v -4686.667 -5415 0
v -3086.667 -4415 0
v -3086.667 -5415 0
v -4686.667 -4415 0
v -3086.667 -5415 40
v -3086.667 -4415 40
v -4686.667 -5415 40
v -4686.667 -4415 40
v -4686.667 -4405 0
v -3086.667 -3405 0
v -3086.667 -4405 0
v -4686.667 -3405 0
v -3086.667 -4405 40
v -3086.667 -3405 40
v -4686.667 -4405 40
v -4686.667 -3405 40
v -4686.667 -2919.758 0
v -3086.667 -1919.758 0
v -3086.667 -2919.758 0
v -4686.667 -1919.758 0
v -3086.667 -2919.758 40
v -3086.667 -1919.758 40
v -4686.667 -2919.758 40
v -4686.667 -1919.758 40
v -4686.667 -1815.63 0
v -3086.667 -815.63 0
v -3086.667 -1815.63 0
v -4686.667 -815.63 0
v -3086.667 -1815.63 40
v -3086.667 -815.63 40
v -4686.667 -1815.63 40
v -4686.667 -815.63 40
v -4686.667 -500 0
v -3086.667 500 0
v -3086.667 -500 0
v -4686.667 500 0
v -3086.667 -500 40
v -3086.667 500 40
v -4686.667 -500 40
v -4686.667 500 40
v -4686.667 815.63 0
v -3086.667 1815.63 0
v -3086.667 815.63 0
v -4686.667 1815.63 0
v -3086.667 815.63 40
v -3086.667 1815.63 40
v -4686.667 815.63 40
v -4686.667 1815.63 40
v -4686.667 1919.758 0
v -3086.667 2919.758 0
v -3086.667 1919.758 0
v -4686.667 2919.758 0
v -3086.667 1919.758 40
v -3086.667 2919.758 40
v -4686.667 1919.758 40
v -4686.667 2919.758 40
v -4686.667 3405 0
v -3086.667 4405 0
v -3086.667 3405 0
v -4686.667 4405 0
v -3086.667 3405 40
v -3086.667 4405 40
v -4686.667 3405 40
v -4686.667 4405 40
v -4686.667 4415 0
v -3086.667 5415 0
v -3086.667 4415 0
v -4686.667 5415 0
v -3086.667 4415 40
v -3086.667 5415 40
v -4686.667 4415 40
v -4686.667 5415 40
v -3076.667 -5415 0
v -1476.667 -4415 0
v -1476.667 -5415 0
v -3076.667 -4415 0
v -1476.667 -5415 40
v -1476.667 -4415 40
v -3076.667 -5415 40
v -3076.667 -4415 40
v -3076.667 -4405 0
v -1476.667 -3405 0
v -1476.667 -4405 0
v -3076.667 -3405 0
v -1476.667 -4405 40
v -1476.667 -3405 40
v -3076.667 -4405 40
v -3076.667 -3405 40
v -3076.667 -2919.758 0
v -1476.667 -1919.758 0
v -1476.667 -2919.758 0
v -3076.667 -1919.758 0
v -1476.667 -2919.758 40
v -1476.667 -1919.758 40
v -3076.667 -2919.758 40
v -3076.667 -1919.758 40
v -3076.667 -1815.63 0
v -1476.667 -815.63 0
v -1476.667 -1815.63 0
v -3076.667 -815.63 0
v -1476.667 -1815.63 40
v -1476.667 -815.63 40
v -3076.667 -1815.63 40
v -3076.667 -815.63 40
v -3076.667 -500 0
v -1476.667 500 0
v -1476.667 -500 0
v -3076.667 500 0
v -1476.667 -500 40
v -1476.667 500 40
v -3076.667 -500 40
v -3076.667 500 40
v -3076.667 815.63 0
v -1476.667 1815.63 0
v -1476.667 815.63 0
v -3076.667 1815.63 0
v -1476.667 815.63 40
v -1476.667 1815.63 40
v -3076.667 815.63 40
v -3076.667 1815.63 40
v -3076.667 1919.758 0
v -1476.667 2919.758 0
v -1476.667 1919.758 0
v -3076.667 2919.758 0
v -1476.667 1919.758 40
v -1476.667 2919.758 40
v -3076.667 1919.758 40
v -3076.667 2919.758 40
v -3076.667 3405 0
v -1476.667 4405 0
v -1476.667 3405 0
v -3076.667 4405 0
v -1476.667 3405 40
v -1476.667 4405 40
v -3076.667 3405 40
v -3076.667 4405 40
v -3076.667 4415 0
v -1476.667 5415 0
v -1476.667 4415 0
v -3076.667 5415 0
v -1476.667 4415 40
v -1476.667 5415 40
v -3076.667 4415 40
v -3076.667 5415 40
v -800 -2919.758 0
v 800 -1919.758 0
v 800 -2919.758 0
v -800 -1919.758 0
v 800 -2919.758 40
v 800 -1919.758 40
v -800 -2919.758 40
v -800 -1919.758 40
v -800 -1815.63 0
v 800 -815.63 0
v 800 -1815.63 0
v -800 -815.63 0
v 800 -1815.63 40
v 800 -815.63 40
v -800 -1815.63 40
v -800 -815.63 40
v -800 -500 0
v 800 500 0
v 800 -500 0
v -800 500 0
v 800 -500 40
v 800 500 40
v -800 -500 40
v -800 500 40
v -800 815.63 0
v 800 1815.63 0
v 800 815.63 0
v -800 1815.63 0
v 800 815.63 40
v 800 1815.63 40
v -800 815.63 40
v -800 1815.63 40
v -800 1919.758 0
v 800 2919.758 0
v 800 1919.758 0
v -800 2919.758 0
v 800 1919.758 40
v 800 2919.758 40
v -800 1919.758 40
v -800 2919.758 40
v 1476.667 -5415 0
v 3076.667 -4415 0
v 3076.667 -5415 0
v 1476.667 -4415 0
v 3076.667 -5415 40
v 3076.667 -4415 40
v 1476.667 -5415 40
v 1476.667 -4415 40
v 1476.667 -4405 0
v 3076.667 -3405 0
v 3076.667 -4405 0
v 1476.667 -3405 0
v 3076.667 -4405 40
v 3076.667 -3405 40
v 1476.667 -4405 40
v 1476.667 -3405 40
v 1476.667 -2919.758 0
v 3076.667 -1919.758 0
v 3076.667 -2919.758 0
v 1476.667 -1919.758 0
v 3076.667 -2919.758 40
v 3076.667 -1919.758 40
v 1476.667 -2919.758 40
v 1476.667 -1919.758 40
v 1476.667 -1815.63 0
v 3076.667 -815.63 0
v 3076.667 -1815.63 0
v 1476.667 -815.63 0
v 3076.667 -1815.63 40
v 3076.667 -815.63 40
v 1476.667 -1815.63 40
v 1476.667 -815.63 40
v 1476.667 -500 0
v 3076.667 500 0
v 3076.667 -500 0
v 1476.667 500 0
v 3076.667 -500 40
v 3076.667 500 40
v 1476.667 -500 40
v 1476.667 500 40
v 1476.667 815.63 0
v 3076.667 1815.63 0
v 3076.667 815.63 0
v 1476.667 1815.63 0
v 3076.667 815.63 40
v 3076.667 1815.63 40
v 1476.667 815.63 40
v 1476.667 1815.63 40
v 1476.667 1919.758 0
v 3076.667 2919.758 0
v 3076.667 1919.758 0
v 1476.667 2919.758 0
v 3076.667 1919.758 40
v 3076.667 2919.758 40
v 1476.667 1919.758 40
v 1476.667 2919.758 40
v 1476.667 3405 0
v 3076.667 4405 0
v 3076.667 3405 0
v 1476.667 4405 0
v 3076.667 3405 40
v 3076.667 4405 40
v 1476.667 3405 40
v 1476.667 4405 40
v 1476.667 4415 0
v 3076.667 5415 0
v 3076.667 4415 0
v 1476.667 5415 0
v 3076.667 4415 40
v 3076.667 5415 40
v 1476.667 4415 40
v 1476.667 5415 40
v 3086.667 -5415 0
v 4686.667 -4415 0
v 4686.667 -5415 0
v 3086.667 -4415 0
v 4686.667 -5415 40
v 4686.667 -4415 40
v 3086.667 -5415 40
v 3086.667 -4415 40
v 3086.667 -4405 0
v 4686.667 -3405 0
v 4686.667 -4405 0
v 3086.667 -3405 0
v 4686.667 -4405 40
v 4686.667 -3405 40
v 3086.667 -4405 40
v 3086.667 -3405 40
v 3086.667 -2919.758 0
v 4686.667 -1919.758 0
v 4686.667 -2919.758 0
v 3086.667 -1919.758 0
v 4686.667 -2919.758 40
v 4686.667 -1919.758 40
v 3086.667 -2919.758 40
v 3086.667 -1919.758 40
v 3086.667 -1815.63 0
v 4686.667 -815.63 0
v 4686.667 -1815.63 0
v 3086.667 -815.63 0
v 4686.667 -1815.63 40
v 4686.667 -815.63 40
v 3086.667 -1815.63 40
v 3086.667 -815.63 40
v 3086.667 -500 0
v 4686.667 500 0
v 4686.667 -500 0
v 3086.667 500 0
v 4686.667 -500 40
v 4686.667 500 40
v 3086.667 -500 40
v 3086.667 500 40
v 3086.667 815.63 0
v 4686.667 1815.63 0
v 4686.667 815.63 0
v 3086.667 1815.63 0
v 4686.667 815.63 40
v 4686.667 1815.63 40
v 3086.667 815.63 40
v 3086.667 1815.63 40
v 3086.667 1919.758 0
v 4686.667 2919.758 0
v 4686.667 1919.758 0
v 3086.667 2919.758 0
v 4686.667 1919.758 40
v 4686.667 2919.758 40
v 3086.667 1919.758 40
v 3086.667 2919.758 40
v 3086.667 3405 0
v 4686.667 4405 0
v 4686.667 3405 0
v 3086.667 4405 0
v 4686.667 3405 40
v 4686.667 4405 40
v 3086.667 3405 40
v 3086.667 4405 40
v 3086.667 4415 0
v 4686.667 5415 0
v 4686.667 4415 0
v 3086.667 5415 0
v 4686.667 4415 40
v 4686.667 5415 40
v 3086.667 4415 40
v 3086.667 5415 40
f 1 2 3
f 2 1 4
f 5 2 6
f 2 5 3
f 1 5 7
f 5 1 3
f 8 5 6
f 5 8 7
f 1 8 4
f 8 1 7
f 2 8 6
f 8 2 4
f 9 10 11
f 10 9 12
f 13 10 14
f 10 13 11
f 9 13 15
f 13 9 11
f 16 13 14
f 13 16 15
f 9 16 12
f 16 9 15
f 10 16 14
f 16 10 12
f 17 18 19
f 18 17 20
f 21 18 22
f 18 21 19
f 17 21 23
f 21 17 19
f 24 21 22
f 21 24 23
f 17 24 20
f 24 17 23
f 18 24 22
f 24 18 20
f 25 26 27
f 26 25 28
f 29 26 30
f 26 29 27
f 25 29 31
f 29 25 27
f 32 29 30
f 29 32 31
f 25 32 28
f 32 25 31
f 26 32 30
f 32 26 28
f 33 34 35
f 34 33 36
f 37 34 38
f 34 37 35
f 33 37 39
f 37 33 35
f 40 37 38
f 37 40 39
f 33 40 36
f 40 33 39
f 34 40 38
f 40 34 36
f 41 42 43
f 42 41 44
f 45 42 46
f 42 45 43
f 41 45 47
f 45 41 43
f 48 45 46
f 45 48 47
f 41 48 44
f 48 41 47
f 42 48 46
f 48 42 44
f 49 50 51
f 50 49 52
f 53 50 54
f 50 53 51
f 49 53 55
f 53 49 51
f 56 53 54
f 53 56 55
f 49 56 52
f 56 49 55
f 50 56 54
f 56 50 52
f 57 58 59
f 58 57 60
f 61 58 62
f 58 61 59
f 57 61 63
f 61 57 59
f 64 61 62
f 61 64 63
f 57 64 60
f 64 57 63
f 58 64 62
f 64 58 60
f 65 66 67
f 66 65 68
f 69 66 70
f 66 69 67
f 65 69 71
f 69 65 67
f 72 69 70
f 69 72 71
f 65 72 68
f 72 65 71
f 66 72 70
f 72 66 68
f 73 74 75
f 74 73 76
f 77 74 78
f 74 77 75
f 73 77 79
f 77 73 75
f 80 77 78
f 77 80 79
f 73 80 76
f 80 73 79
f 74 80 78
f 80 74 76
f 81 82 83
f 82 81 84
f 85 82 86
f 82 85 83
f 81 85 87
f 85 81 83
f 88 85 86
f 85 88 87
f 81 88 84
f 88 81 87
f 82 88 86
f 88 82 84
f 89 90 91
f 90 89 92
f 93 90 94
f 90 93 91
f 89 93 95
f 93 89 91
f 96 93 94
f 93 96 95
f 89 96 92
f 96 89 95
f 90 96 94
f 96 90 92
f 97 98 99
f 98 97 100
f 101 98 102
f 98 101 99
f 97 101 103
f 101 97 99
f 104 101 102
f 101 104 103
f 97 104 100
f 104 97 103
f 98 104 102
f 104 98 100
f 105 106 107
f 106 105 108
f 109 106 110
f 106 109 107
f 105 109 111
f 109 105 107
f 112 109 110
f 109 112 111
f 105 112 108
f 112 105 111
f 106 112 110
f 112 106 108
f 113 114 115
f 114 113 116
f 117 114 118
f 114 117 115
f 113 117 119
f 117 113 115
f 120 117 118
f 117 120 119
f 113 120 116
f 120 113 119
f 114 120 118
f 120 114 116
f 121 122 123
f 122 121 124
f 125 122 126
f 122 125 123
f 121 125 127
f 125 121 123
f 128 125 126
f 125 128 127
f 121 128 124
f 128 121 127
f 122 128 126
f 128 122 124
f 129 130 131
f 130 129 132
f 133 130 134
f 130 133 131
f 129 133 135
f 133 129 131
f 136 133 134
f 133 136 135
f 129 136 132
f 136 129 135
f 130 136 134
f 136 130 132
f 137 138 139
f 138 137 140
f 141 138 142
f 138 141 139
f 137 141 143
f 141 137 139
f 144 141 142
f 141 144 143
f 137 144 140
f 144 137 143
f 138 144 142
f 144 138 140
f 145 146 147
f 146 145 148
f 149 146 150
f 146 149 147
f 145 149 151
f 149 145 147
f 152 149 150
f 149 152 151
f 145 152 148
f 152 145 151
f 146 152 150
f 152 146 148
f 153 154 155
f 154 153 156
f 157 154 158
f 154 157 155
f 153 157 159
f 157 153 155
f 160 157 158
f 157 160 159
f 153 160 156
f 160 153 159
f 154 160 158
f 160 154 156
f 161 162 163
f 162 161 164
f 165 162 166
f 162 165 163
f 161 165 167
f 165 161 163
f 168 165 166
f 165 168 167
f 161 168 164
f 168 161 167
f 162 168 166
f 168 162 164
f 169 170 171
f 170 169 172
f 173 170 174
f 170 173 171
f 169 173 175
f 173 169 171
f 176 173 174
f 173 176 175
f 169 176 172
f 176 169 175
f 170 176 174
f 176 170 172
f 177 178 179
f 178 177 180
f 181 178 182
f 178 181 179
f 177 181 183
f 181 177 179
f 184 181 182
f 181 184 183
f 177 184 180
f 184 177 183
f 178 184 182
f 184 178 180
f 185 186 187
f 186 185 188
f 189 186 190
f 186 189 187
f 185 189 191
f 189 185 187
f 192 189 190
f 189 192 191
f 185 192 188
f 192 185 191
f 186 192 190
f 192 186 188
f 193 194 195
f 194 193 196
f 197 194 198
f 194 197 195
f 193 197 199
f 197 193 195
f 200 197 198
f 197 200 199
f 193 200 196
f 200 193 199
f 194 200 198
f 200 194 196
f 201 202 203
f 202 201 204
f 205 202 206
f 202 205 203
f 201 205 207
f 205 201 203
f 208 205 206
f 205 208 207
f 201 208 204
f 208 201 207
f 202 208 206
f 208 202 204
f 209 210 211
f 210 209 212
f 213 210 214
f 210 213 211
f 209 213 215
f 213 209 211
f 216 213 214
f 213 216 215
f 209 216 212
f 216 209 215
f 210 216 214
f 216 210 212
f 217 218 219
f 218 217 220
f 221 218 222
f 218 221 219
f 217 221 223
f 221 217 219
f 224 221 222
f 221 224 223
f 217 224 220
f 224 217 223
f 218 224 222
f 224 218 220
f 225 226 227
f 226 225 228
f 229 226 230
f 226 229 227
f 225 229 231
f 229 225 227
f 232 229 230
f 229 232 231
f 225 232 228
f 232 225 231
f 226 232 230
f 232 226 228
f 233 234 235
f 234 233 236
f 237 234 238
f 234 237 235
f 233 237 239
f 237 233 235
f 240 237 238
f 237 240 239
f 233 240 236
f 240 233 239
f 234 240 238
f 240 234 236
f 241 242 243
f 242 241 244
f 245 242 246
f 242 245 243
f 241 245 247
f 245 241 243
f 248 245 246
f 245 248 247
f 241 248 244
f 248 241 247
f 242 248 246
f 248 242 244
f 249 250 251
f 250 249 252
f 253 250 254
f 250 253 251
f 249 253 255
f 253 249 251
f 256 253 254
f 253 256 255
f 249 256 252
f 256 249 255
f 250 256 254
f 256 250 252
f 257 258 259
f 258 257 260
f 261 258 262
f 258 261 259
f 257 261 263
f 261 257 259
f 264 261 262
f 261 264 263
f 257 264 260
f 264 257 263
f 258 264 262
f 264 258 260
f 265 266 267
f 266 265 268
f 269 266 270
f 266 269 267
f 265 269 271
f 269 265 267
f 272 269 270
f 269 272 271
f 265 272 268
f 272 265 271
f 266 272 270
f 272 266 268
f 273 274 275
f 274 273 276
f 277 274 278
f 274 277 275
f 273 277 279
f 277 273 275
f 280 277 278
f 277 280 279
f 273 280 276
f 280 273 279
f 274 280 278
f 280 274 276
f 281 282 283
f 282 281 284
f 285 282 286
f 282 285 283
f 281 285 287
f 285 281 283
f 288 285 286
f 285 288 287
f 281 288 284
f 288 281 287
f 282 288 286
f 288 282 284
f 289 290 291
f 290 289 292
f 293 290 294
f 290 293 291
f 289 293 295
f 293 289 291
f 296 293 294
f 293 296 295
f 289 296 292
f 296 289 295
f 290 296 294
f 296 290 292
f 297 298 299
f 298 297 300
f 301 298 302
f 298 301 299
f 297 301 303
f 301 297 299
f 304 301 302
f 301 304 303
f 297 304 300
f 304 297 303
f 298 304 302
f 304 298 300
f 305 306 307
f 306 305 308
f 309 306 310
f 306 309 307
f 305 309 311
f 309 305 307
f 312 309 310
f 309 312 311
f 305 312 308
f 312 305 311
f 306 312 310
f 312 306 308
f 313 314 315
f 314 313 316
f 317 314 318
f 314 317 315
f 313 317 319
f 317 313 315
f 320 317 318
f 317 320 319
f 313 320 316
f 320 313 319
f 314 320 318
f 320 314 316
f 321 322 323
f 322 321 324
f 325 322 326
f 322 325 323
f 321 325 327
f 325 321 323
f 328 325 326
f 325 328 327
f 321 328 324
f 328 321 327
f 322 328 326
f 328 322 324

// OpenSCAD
// Generated by Parametrix
ca_surface_faceSurface_000 = [ [ -4686.6667, -5415.0000 ],[ -3086.6667, -5415.0000 ],[ -3086.6667, -4415.0000 ],[ -4686.6667, -4415.0000 ],[ -4686.6667, -5415.0000 ] ];
cb_surface_faceSurface_000 = [  0, 1, 2, 3, 4 ];
ca_surface_faceSurface_001 = [ [ -4686.6667, -4405.0000 ],[ -3086.6667, -4405.0000 ],[ -3086.6667, -3405.0000 ],[ -4686.6667, -3405.0000 ],[ -4686.6667, -4405.0000 ] ];
cb_surface_faceSurface_001 = [  5, 6, 7, 8, 9 ];
ca_surface_faceSurface_002 = [ [ -4686.6667, -2919.7578 ],[ -3086.6667, -2919.7578 ],[ -3086.6667, -1919.7578 ],[ -4686.6667, -1919.7578 ],[ -4686.6667, -2919.7578 ] ];
cb_surface_faceSurface_002 = [  10, 11, 12, 13, 14 ];
ca_surface_faceSurface_003 = [ [ -4686.6667, -1815.6302 ],[ -3086.6667, -1815.6302 ],[ -3086.6667, -815.6302 ],[ -4686.6667, -815.6302 ],[ -4686.6667, -1815.6302 ] ];
cb_surface_faceSurface_003 = [  15, 16, 17, 18, 19 ];
ca_surface_faceSurface_004 = [ [ -4686.6667, -500.0000 ],[ -3086.6667, -500.0000 ],[ -3086.6667, 500.0000 ],[ -4686.6667, 500.0000 ],[ -4686.6667, -500.0000 ] ];
cb_surface_faceSurface_004 = [  20, 21, 22, 23, 24 ];
ca_surface_faceSurface_005 = [ [ -4686.6667, 815.6302 ],[ -3086.6667, 815.6302 ],[ -3086.6667, 1815.6302 ],[ -4686.6667, 1815.6302 ],[ -4686.6667, 815.6302 ] ];
cb_surface_faceSurface_005 = [  25, 26, 27, 28, 29 ];
ca_surface_faceSurface_006 = [ [ -4686.6667, 1919.7578 ],[ -3086.6667, 1919.7578 ],[ -3086.6667, 2919.7578 ],[ -4686.6667, 2919.7578 ],[ -4686.6667, 1919.7578 ] ];
cb_surface_faceSurface_006 = [  30, 31, 32, 33, 34 ];
ca_surface_faceSurface_007 = [ [ -4686.6667, 3405.0000 ],[ -3086.6667, 3405.0000 ],[ -3086.6667, 4405.0000 ],[ -4686.6667, 4405.0000 ],[ -4686.6667, 3405.0000 ] ];
cb_surface_faceSurface_007 = [  35, 36, 37, 38, 39 ];
ca_surface_faceSurface_008 = [ [ -4686.6667, 4415.0000 ],[ -3086.6667, 4415.0000 ],[ -3086.6667, 5415.0000 ],[ -4686.6667, 5415.0000 ],[ -4686.6667, 4415.0000 ] ];
cb_surface_faceSurface_008 = [  40, 41, 42, 43, 44 ];
ca_surface_faceSurface_009 = [ [ -3076.6667, -5415.0000 ],[ -1476.6667, -5415.0000 ],[ -1476.6667, -4415.0000 ],[ -3076.6667, -4415.0000 ],[ -3076.6667, -5415.0000 ] ];
cb_surface_faceSurface_009 = [  45, 46, 47, 48, 49 ];
ca_surface_faceSurface_010 = [ [ -3076.6667, -4405.0000 ],[ -1476.6667, -4405.0000 ],[ -1476.6667, -3405.0000 ],[ -3076.6667, -3405.0000 ],[ -3076.6667, -4405.0000 ] ];
cb_surface_faceSurface_010 = [  50, 51, 52, 53, 54 ];
ca_surface_faceSurface_011 = [ [ -3076.6667, -2919.7578 ],[ -1476.6667, -2919.7578 ],[ -1476.6667, -1919.7578 ],[ -3076.6667, -1919.7578 ],[ -3076.6667, -2919.7578 ] ];
cb_surface_faceSurface_011 = [  55, 56, 57, 58, 59 ];
ca_surface_faceSurface_012 = [ [ -3076.6667, -1815.6302 ],[ -1476.6667, -1815.6302 ],[ -1476.6667, -815.6302 ],[ -3076.6667, -815.6302 ],[ -3076.6667, -1815.6302 ] ];
cb_surface_faceSurface_012 = [  60, 61, 62, 63, 64 ];
ca_surface_faceSurface_013 = [ [ -3076.6667, -500.0000 ],[ -1476.6667, -500.0000 ],[ -1476.6667, 500.0000 ],[ -3076.6667, 500.0000 ],[ -3076.6667, -500.0000 ] ];
cb_surface_faceSurface_013 = [  65, 66, 67, 68, 69 ];
ca_surface_faceSurface_014 = [ [ -3076.6667, 815.6302 ],[ -1476.6667, 815.6302 ],[ -1476.6667, 1815.6302 ],[ -3076.6667, 1815.6302 ],[ -3076.6667, 815.6302 ] ];
cb_surface_faceSurface_014 = [  70, 71, 72, 73, 74 ];
ca_surface_faceSurface_015 = [ [ -3076.6667, 1919.7578 ],[ -1476.6667, 1919.7578 ],[ -1476.6667, 2919.7578 ],[ -3076.6667, 2919.7578 ],[ -3076.6667, 1919.7578 ] ];
cb_surface_faceSurface_015 = [  75, 76, 77, 78, 79 ];
ca_surface_faceSurface_016 = [ [ -3076.6667, 3405.0000 ],[ -1476.6667, 3405.0000 ],[ -1476.6667, 4405.0000 ],[ -3076.6667, 4405.0000 ],[ -3076.6667, 3405.0000 ] ];
cb_surface_faceSurface_016 = [  80, 81, 82, 83, 84 ];
ca_surface_faceSurface_017 = [ [ -3076.6667, 4415.0000 ],[ -1476.6667, 4415.0000 ],[ -1476.6667, 5415.0000 ],[ -3076.6667, 5415.0000 ],[ -3076.6667, 4415.0000 ] ];
cb_surface_faceSurface_017 = [  85, 86, 87, 88, 89 ];
ca_surface_faceSurface_018 = [ [ -800.0000, -2919.7578 ],[ 800.0000, -2919.7578 ],[ 800.0000, -1919.7578 ],[ -800.0000, -1919.7578 ],[ -800.0000, -2919.7578 ] ];
cb_surface_faceSurface_018 = [  90, 91, 92, 93, 94 ];
ca_surface_faceSurface_019 = [ [ -800.0000, -1815.6302 ],[ 800.0000, -1815.6302 ],[ 800.0000, -815.6302 ],[ -800.0000, -815.6302 ],[ -800.0000, -1815.6302 ] ];
cb_surface_faceSurface_019 = [  95, 96, 97, 98, 99 ];
ca_surface_faceSurface_020 = [ [ -800.0000, -500.0000 ],[ 800.0000, -500.0000 ],[ 800.0000, 500.0000 ],[ -800.0000, 500.0000 ],[ -800.0000, -500.0000 ] ];
cb_surface_faceSurface_020 = [  100, 101, 102, 103, 104 ];
ca_surface_faceSurface_021 = [ [ -800.0000, 815.6302 ],[ 800.0000, 815.6302 ],[ 800.0000, 1815.6302 ],[ -800.0000, 1815.6302 ],[ -800.0000, 815.6302 ] ];
cb_surface_faceSurface_021 = [  105, 106, 107, 108, 109 ];
ca_surface_faceSurface_022 = [ [ -800.0000, 1919.7578 ],[ 800.0000, 1919.7578 ],[ 800.0000, 2919.7578 ],[ -800.0000, 2919.7578 ],[ -800.0000, 1919.7578 ] ];
cb_surface_faceSurface_022 = [  110, 111, 112, 113, 114 ];
ca_surface_faceSurface_023 = [ [ 1476.6667, -5415.0000 ],[ 3076.6667, -5415.0000 ],[ 3076.6667, -4415.0000 ],[ 1476.6667, -4415.0000 ],[ 1476.6667, -5415.0000 ] ];
cb_surface_faceSurface_023 = [  115, 116, 117, 118, 119 ];
ca_surface_faceSurface_024 = [ [ 1476.6667, -4405.0000 ],[ 3076.6667, -4405.0000 ],[ 3076.6667, -3405.0000 ],[ 1476.6667, -3405.0000 ],[ 1476.6667, -4405.0000 ] ];
cb_surface_faceSurface_024 = [  120, 121, 122, 123, 124 ];
ca_surface_faceSurface_025 = [ [ 1476.6667, -2919.7578 ],[ 3076.6667, -2919.7578 ],[ 3076.6667, -1919.7578 ],[ 1476.6667, -1919.7578 ],[ 1476.6667, -2919.7578 ] ];
cb_surface_faceSurface_025 = [  125, 126, 127, 128, 129 ];
ca_surface_faceSurface_026 = [ [ 1476.6667, -1815.6302 ],[ 3076.6667, -1815.6302 ],[ 3076.6667, -815.6302 ],[ 1476.6667, -815.6302 ],[ 1476.6667, -1815.6302 ] ];
cb_surface_faceSurface_026 = [  130, 131, 132, 133, 134 ];
ca_surface_faceSurface_027 = [ [ 1476.6667, -500.0000 ],[ 3076.6667, -500.0000 ],[ 3076.6667, 500.0000 ],[ 1476.6667, 500.0000 ],[ 1476.6667, -500.0000 ] ];
cb_surface_faceSurface_027 = [  135, 136, 137, 138, 139 ];
ca_surface_faceSurface_028 = [ [ 1476.6667, 815.6302 ],[ 3076.6667, 815.6302 ],[ 3076.6667, 1815.6302 ],[ 1476.6667, 1815.6302 ],[ 1476.6667, 815.6302 ] ];
cb_surface_faceSurface_028 = [  140, 141, 142, 143, 144 ];
ca_surface_faceSurface_029 = [ [ 1476.6667, 1919.7578 ],[ 3076.6667, 1919.7578 ],[ 3076.6667, 2919.7578 ],[ 1476.6667, 2919.7578 ],[ 1476.6667, 1919.7578 ] ];
cb_surface_faceSurface_029 = [  145, 146, 147, 148, 149 ];
ca_surface_faceSurface_030 = [ [ 1476.6667, 3405.0000 ],[ 3076.6667, 3405.0000 ],[ 3076.6667, 4405.0000 ],[ 1476.6667, 4405.0000 ],[ 1476.6667, 3405.0000 ] ];
cb_surface_faceSurface_030 = [  150, 151, 152, 153, 154 ];
ca_surface_faceSurface_031 = [ [ 1476.6667, 4415.0000 ],[ 3076.6667, 4415.0000 ],[ 3076.6667, 5415.0000 ],[ 1476.6667, 5415.0000 ],[ 1476.6667, 4415.0000 ] ];
cb_surface_faceSurface_031 = [  155, 156, 157, 158, 159 ];
ca_surface_faceSurface_032 = [ [ 3086.6667, -5415.0000 ],[ 4686.6667, -5415.0000 ],[ 4686.6667, -4415.0000 ],[ 3086.6667, -4415.0000 ],[ 3086.6667, -5415.0000 ] ];
cb_surface_faceSurface_032 = [  160, 161, 162, 163, 164 ];
ca_surface_faceSurface_033 = [ [ 3086.6667, -4405.0000 ],[ 4686.6667, -4405.0000 ],[ 4686.6667, -3405.0000 ],[ 3086.6667, -3405.0000 ],[ 3086.6667, -4405.0000 ] ];
cb_surface_faceSurface_033 = [  165, 166, 167, 168, 169 ];
ca_surface_faceSurface_034 = [ [ 3086.6667, -2919.7578 ],[ 4686.6667, -2919.7578 ],[ 4686.6667, -1919.7578 ],[ 3086.6667, -1919.7578 ],[ 3086.6667, -2919.7578 ] ];
cb_surface_faceSurface_034 = [  170, 171, 172, 173, 174 ];
ca_surface_faceSurface_035 = [ [ 3086.6667, -1815.6302 ],[ 4686.6667, -1815.6302 ],[ 4686.6667, -815.6302 ],[ 3086.6667, -815.6302 ],[ 3086.6667, -1815.6302 ] ];
cb_surface_faceSurface_035 = [  175, 176, 177, 178, 179 ];
ca_surface_faceSurface_036 = [ [ 3086.6667, -500.0000 ],[ 4686.6667, -500.0000 ],[ 4686.6667, 500.0000 ],[ 3086.6667, 500.0000 ],[ 3086.6667, -500.0000 ] ];
cb_surface_faceSurface_036 = [  180, 181, 182, 183, 184 ];
ca_surface_faceSurface_037 = [ [ 3086.6667, 815.6302 ],[ 4686.6667, 815.6302 ],[ 4686.6667, 1815.6302 ],[ 3086.6667, 1815.6302 ],[ 3086.6667, 815.6302 ] ];
cb_surface_faceSurface_037 = [  185, 186, 187, 188, 189 ];
ca_surface_faceSurface_038 = [ [ 3086.6667, 1919.7578 ],[ 4686.6667, 1919.7578 ],[ 4686.6667, 2919.7578 ],[ 3086.6667, 2919.7578 ],[ 3086.6667, 1919.7578 ] ];
cb_surface_faceSurface_038 = [  190, 191, 192, 193, 194 ];
ca_surface_faceSurface_039 = [ [ 3086.6667, 3405.0000 ],[ 4686.6667, 3405.0000 ],[ 4686.6667, 4405.0000 ],[ 3086.6667, 4405.0000 ],[ 3086.6667, 3405.0000 ] ];
cb_surface_faceSurface_039 = [  195, 196, 197, 198, 199 ];
ca_surface_faceSurface_040 = [ [ 3086.6667, 4415.0000 ],[ 4686.6667, 4415.0000 ],[ 4686.6667, 5415.0000 ],[ 3086.6667, 5415.0000 ],[ 3086.6667, 4415.0000 ] ];
cb_surface_faceSurface_040 = [  200, 201, 202, 203, 204 ];
a_surface_faceSurface = concat(ca_surface_faceSurface_000, ca_surface_faceSurface_001, ca_surface_faceSurface_002, ca_surface_faceSurface_003, ca_surface_faceSurface_004, ca_surface_faceSurface_005, ca_surface_faceSurface_006, ca_surface_faceSurface_007, ca_surface_faceSurface_008, ca_surface_faceSurface_009, ca_surface_faceSurface_010, ca_surface_faceSurface_011, ca_surface_faceSurface_012, ca_surface_faceSurface_013, ca_surface_faceSurface_014, ca_surface_faceSurface_015, ca_surface_faceSurface_016, ca_surface_faceSurface_017, ca_surface_faceSurface_018, ca_surface_faceSurface_019, ca_surface_faceSurface_020, ca_surface_faceSurface_021, ca_surface_faceSurface_022, ca_surface_faceSurface_023, ca_surface_faceSurface_024, ca_surface_faceSurface_025, ca_surface_faceSurface_026, ca_surface_faceSurface_027, ca_surface_faceSurface_028, ca_surface_faceSurface_029, ca_surface_faceSurface_030, ca_surface_faceSurface_031, ca_surface_faceSurface_032, ca_surface_faceSurface_033, ca_surface_faceSurface_034, ca_surface_faceSurface_035, ca_surface_faceSurface_036, ca_surface_faceSurface_037, ca_surface_faceSurface_038, ca_surface_faceSurface_039, ca_surface_faceSurface_040);
b_surface_faceSurface = [cb_surface_faceSurface_000, cb_surface_faceSurface_001, cb_surface_faceSurface_002, cb_surface_faceSurface_003, cb_surface_faceSurface_004, cb_surface_faceSurface_005, cb_surface_faceSurface_006, cb_surface_faceSurface_007, cb_surface_faceSurface_008, cb_surface_faceSurface_009, cb_surface_faceSurface_010, cb_surface_faceSurface_011, cb_surface_faceSurface_012, cb_surface_faceSurface_013, cb_surface_faceSurface_014, cb_surface_faceSurface_015, cb_surface_faceSurface_016, cb_surface_faceSurface_017, cb_surface_faceSurface_018, cb_surface_faceSurface_019, cb_surface_faceSurface_020, cb_surface_faceSurface_021, cb_surface_faceSurface_022, cb_surface_faceSurface_023, cb_surface_faceSurface_024, cb_surface_faceSurface_025, cb_surface_faceSurface_026, cb_surface_faceSurface_027, cb_surface_faceSurface_028, cb_surface_faceSurface_029, cb_surface_faceSurface_030, cb_surface_faceSurface_031, cb_surface_faceSurface_032, cb_surface_faceSurface_033, cb_surface_faceSurface_034, cb_surface_faceSurface_035, cb_surface_faceSurface_036, cb_surface_faceSurface_037, cb_surface_faceSurface_038, cb_surface_faceSurface_039, cb_surface_faceSurface_040];
ca_surface_faceOnePanel_000 = [ [ 0.0000, 0.0000 ],[ 1600.0000, 0.0000 ],[ 1600.0000, 1000.0000 ],[ 0.0000, 1000.0000 ],[ 0.0000, 0.0000 ] ];
cb_surface_faceOnePanel_000 = [  0, 1, 2, 3, 4 ];
a_surface_faceOnePanel = concat(ca_surface_faceOnePanel_000);
b_surface_faceOnePanel = [cb_surface_faceOnePanel_000];

module subpax_surface_panel_0 () {
	translate( [ -4686.666666666667, -5415, 0 ])
		rotate( [ 0, 0, 0 ])
			   linear_extrude(height = 40) polygon(a_surface_faceOnePanel, b_surface_faceOnePanel);
}

module subpax_surface_panel_1 () {
	translate( [ -4686.666666666667, -4405, 0 ])
		rotate( [ 0, 0, 0 ])
			   linear_extrude(height = 40) polygon(a_surface_faceOnePanel, b_surface_faceOnePanel);
}

module subpax_surface_panel_2 () {
	translate( [ -4686.666666666667, -2919.7577830243954, 0 ])
		rotate( [ 0, 0, 0 ])
			   linear_extrude(height = 40) polygon(a_surface_faceOnePanel, b_surface_faceOnePanel);
}

module subpax_surface_panel_3 () {
	translate( [ -4686.666666666667, -1815.6302334890786, 0 ])
		rotate( [ 0, 0, 0 ])
			   linear_extrude(height = 40) polygon(a_surface_faceOnePanel, b_surface_faceOnePanel);
}

module subpax_surface_panel_4 () {
	translate( [ -4686.666666666667, -499.9999999999998, 0 ])
		rotate( [ 0, 0, 0 ])
			   linear_extrude(height = 40) polygon(a_surface_faceOnePanel, b_surface_faceOnePanel);
}

module subpax_surface_panel_5 () {
	translate( [ -4686.666666666667, 815.630233489079, 0 ])
		rotate( [ 0, 0, 0 ])
			   linear_extrude(height = 40) polygon(a_surface_faceOnePanel, b_surface_faceOnePanel);
}

module subpax_surface_panel_6 () {
	translate( [ -4686.666666666667, 1919.7577830243956, 0 ])
		rotate( [ 0, 0, 0 ])
			   linear_extrude(height = 40) polygon(a_surface_faceOnePanel, b_surface_faceOnePanel);
}

module subpax_surface_panel_7 () {
	translate( [ -4686.666666666667, 3405, 0 ])
		rotate( [ 0, 0, 0 ])
			   linear_extrude(height = 40) polygon(a_surface_faceOnePanel, b_surface_faceOnePanel);
}

module subpax_surface_panel_8 () {
	translate( [ -4686.666666666667, 4415, 0 ])
		rotate( [ 0, 0, 0 ])
			   linear_extrude(height = 40) polygon(a_surface_faceOnePanel, b_surface_faceOnePanel);
}

module subpax_surface_panel_9 () {
	translate( [ -3076.666666666667, -5415, 0 ])
		rotate( [ 0, 0, 0 ])
			   linear_extrude(height = 40) polygon(a_surface_faceOnePanel, b_surface_faceOnePanel);
}

module subpax_surface_panel_10 () {
	translate( [ -3076.666666666667, -4405, 0 ])
		rotate( [ 0, 0, 0 ])
			   linear_extrude(height = 40) polygon(a_surface_faceOnePanel, b_surface_faceOnePanel);
}

module subpax_surface_panel_11 () {
	translate( [ -3076.666666666667, -2919.7577830243954, 0 ])
		rotate( [ 0, 0, 0 ])
			   linear_extrude(height = 40) polygon(a_surface_faceOnePanel, b_surface_faceOnePanel);
}

module subpax_surface_panel_12 () {
	translate( [ -3076.666666666667, -1815.6302334890786, 0 ])
		rotate( [ 0, 0, 0 ])
			   linear_extrude(height = 40) polygon(a_surface_faceOnePanel, b_surface_faceOnePanel);
}

module subpax_surface_panel_13 () {
	translate( [ -3076.666666666667, -499.9999999999998, 0 ])
		rotate( [ 0, 0, 0 ])
			   linear_extrude(height = 40) polygon(a_surface_faceOnePanel, b_surface_faceOnePanel);
}

module subpax_surface_panel_14 () {
	translate( [ -3076.666666666667, 815.630233489079, 0 ])
		rotate( [ 0, 0, 0 ])
			   linear_extrude(height = 40) polygon(a_surface_faceOnePanel, b_surface_faceOnePanel);
}

module subpax_surface_panel_15 () {
	translate( [ -3076.666666666667, 1919.7577830243956, 0 ])
		rotate( [ 0, 0, 0 ])
			   linear_extrude(height = 40) polygon(a_surface_faceOnePanel, b_surface_faceOnePanel);
}

module subpax_surface_panel_16 () {
	translate( [ -3076.666666666667, 3405, 0 ])
		rotate( [ 0, 0, 0 ])
			   linear_extrude(height = 40) polygon(a_surface_faceOnePanel, b_surface_faceOnePanel);
}

module subpax_surface_panel_17 () {
	translate( [ -3076.666666666667, 4415, 0 ])
		rotate( [ 0, 0, 0 ])
			   linear_extrude(height = 40) polygon(a_surface_faceOnePanel, b_surface_faceOnePanel);
}

module subpax_surface_panel_18 () {
	translate( [ -800.0000000000002, -2919.7577830243954, 0 ])
		rotate( [ 0, 0, 0 ])
			   linear_extrude(height = 40) polygon(a_surface_faceOnePanel, b_surface_faceOnePanel);
}

module subpax_surface_panel_19 () {
	translate( [ -800.0000000000002, -1815.6302334890786, 0 ])
		rotate( [ 0, 0, 0 ])
			   linear_extrude(height = 40) polygon(a_surface_faceOnePanel, b_surface_faceOnePanel);
}

module subpax_surface_panel_20 () {
	translate( [ -800.0000000000002, -499.9999999999998, 0 ])
		rotate( [ 0, 0, 0 ])
			   linear_extrude(height = 40) polygon(a_surface_faceOnePanel, b_surface_faceOnePanel);
}

module subpax_surface_panel_21 () {
	translate( [ -800.0000000000002, 815.630233489079, 0 ])
		rotate( [ 0, 0, 0 ])
			   linear_extrude(height = 40) polygon(a_surface_faceOnePanel, b_surface_faceOnePanel);
}

module subpax_surface_panel_22 () {
	translate( [ -800.0000000000002, 1919.7577830243956, 0 ])
		rotate( [ 0, 0, 0 ])
			   linear_extrude(height = 40) polygon(a_surface_faceOnePanel, b_surface_faceOnePanel);
}

module subpax_surface_panel_23 () {
	translate( [ 1476.6666666666663, -5415, 0 ])
		rotate( [ 0, 0, 0 ])
			   linear_extrude(height = 40) polygon(a_surface_faceOnePanel, b_surface_faceOnePanel);
}

module subpax_surface_panel_24 () {
	translate( [ 1476.6666666666663, -4405, 0 ])
		rotate( [ 0, 0, 0 ])
			   linear_extrude(height = 40) polygon(a_surface_faceOnePanel, b_surface_faceOnePanel);
}

module subpax_surface_panel_25 () {
	translate( [ 1476.6666666666663, -2919.7577830243954, 0 ])
		rotate( [ 0, 0, 0 ])
			   linear_extrude(height = 40) polygon(a_surface_faceOnePanel, b_surface_faceOnePanel);
}

module subpax_surface_panel_26 () {
	translate( [ 1476.6666666666663, -1815.6302334890786, 0 ])
		rotate( [ 0, 0, 0 ])
			   linear_extrude(height = 40) polygon(a_surface_faceOnePanel, b_surface_faceOnePanel);
}

module subpax_surface_panel_27 () {
	translate( [ 1476.6666666666663, -499.9999999999998, 0 ])
		rotate( [ 0, 0, 0 ])
			   linear_extrude(height = 40) polygon(a_surface_faceOnePanel, b_surface_faceOnePanel);
}

module subpax_surface_panel_28 () {
	translate( [ 1476.6666666666663, 815.630233489079, 0 ])
		rotate( [ 0, 0, 0 ])
			   linear_extrude(height = 40) polygon(a_surface_faceOnePanel, b_surface_faceOnePanel);
}

module subpax_surface_panel_29 () {
	translate( [ 1476.6666666666663, 1919.7577830243956, 0 ])
		rotate( [ 0, 0, 0 ])
			   linear_extrude(height = 40) polygon(a_surface_faceOnePanel, b_surface_faceOnePanel);
}

module subpax_surface_panel_30 () {
	translate( [ 1476.6666666666663, 3405, 0 ])
		rotate( [ 0, 0, 0 ])
			   linear_extrude(height = 40) polygon(a_surface_faceOnePanel, b_surface_faceOnePanel);
}

module subpax_surface_panel_31 () {
	translate( [ 1476.6666666666663, 4415, 0 ])
		rotate( [ 0, 0, 0 ])
			   linear_extrude(height = 40) polygon(a_surface_faceOnePanel, b_surface_faceOnePanel);
}

module subpax_surface_panel_32 () {
	translate( [ 3086.666666666666, -5415, 0 ])
		rotate( [ 0, 0, 0 ])
			   linear_extrude(height = 40) polygon(a_surface_faceOnePanel, b_surface_faceOnePanel);
}

module subpax_surface_panel_33 () {
	translate( [ 3086.666666666666, -4405, 0 ])
		rotate( [ 0, 0, 0 ])
			   linear_extrude(height = 40) polygon(a_surface_faceOnePanel, b_surface_faceOnePanel);
}

module subpax_surface_panel_34 () {
	translate( [ 3086.666666666666, -2919.7577830243954, 0 ])
		rotate( [ 0, 0, 0 ])
			   linear_extrude(height = 40) polygon(a_surface_faceOnePanel, b_surface_faceOnePanel);
}

module subpax_surface_panel_35 () {
	translate( [ 3086.666666666666, -1815.6302334890786, 0 ])
		rotate( [ 0, 0, 0 ])
			   linear_extrude(height = 40) polygon(a_surface_faceOnePanel, b_surface_faceOnePanel);
}

module subpax_surface_panel_36 () {
	translate( [ 3086.666666666666, -499.9999999999998, 0 ])
		rotate( [ 0, 0, 0 ])
			   linear_extrude(height = 40) polygon(a_surface_faceOnePanel, b_surface_faceOnePanel);
}

module subpax_surface_panel_37 () {
	translate( [ 3086.666666666666, 815.630233489079, 0 ])
		rotate( [ 0, 0, 0 ])
			   linear_extrude(height = 40) polygon(a_surface_faceOnePanel, b_surface_faceOnePanel);
}

module subpax_surface_panel_38 () {
	translate( [ 3086.666666666666, 1919.7577830243956, 0 ])
		rotate( [ 0, 0, 0 ])
			   linear_extrude(height = 40) polygon(a_surface_faceOnePanel, b_surface_faceOnePanel);
}

module subpax_surface_panel_39 () {
	translate( [ 3086.666666666666, 3405, 0 ])
		rotate( [ 0, 0, 0 ])
			   linear_extrude(height = 40) polygon(a_surface_faceOnePanel, b_surface_faceOnePanel);
}

module subpax_surface_panel_40 () {
	translate( [ 3086.666666666666, 4415, 0 ])
		rotate( [ 0, 0, 0 ])
			   linear_extrude(height = 40) polygon(a_surface_faceOnePanel, b_surface_faceOnePanel);
}

module pax_surface () {
	union () {
		subpax_surface_panel_0();
subpax_surface_panel_1();
subpax_surface_panel_2();
subpax_surface_panel_3();
subpax_surface_panel_4();
subpax_surface_panel_5();
subpax_surface_panel_6();
subpax_surface_panel_7();
subpax_surface_panel_8();
subpax_surface_panel_9();
subpax_surface_panel_10();
subpax_surface_panel_11();
subpax_surface_panel_12();
subpax_surface_panel_13();
subpax_surface_panel_14();
subpax_surface_panel_15();
subpax_surface_panel_16();
subpax_surface_panel_17();
subpax_surface_panel_18();
subpax_surface_panel_19();
subpax_surface_panel_20();
subpax_surface_panel_21();
subpax_surface_panel_22();
subpax_surface_panel_23();
subpax_surface_panel_24();
subpax_surface_panel_25();
subpax_surface_panel_26();
subpax_surface_panel_27();
subpax_surface_panel_28();
subpax_surface_panel_29();
subpax_surface_panel_30();
subpax_surface_panel_31();
subpax_surface_panel_32();
subpax_surface_panel_33();
subpax_surface_panel_34();
subpax_surface_panel_35();
subpax_surface_panel_36();
subpax_surface_panel_37();
subpax_surface_panel_38();
subpax_surface_panel_39();
subpax_surface_panel_40();
	}
}

pax_surface();
